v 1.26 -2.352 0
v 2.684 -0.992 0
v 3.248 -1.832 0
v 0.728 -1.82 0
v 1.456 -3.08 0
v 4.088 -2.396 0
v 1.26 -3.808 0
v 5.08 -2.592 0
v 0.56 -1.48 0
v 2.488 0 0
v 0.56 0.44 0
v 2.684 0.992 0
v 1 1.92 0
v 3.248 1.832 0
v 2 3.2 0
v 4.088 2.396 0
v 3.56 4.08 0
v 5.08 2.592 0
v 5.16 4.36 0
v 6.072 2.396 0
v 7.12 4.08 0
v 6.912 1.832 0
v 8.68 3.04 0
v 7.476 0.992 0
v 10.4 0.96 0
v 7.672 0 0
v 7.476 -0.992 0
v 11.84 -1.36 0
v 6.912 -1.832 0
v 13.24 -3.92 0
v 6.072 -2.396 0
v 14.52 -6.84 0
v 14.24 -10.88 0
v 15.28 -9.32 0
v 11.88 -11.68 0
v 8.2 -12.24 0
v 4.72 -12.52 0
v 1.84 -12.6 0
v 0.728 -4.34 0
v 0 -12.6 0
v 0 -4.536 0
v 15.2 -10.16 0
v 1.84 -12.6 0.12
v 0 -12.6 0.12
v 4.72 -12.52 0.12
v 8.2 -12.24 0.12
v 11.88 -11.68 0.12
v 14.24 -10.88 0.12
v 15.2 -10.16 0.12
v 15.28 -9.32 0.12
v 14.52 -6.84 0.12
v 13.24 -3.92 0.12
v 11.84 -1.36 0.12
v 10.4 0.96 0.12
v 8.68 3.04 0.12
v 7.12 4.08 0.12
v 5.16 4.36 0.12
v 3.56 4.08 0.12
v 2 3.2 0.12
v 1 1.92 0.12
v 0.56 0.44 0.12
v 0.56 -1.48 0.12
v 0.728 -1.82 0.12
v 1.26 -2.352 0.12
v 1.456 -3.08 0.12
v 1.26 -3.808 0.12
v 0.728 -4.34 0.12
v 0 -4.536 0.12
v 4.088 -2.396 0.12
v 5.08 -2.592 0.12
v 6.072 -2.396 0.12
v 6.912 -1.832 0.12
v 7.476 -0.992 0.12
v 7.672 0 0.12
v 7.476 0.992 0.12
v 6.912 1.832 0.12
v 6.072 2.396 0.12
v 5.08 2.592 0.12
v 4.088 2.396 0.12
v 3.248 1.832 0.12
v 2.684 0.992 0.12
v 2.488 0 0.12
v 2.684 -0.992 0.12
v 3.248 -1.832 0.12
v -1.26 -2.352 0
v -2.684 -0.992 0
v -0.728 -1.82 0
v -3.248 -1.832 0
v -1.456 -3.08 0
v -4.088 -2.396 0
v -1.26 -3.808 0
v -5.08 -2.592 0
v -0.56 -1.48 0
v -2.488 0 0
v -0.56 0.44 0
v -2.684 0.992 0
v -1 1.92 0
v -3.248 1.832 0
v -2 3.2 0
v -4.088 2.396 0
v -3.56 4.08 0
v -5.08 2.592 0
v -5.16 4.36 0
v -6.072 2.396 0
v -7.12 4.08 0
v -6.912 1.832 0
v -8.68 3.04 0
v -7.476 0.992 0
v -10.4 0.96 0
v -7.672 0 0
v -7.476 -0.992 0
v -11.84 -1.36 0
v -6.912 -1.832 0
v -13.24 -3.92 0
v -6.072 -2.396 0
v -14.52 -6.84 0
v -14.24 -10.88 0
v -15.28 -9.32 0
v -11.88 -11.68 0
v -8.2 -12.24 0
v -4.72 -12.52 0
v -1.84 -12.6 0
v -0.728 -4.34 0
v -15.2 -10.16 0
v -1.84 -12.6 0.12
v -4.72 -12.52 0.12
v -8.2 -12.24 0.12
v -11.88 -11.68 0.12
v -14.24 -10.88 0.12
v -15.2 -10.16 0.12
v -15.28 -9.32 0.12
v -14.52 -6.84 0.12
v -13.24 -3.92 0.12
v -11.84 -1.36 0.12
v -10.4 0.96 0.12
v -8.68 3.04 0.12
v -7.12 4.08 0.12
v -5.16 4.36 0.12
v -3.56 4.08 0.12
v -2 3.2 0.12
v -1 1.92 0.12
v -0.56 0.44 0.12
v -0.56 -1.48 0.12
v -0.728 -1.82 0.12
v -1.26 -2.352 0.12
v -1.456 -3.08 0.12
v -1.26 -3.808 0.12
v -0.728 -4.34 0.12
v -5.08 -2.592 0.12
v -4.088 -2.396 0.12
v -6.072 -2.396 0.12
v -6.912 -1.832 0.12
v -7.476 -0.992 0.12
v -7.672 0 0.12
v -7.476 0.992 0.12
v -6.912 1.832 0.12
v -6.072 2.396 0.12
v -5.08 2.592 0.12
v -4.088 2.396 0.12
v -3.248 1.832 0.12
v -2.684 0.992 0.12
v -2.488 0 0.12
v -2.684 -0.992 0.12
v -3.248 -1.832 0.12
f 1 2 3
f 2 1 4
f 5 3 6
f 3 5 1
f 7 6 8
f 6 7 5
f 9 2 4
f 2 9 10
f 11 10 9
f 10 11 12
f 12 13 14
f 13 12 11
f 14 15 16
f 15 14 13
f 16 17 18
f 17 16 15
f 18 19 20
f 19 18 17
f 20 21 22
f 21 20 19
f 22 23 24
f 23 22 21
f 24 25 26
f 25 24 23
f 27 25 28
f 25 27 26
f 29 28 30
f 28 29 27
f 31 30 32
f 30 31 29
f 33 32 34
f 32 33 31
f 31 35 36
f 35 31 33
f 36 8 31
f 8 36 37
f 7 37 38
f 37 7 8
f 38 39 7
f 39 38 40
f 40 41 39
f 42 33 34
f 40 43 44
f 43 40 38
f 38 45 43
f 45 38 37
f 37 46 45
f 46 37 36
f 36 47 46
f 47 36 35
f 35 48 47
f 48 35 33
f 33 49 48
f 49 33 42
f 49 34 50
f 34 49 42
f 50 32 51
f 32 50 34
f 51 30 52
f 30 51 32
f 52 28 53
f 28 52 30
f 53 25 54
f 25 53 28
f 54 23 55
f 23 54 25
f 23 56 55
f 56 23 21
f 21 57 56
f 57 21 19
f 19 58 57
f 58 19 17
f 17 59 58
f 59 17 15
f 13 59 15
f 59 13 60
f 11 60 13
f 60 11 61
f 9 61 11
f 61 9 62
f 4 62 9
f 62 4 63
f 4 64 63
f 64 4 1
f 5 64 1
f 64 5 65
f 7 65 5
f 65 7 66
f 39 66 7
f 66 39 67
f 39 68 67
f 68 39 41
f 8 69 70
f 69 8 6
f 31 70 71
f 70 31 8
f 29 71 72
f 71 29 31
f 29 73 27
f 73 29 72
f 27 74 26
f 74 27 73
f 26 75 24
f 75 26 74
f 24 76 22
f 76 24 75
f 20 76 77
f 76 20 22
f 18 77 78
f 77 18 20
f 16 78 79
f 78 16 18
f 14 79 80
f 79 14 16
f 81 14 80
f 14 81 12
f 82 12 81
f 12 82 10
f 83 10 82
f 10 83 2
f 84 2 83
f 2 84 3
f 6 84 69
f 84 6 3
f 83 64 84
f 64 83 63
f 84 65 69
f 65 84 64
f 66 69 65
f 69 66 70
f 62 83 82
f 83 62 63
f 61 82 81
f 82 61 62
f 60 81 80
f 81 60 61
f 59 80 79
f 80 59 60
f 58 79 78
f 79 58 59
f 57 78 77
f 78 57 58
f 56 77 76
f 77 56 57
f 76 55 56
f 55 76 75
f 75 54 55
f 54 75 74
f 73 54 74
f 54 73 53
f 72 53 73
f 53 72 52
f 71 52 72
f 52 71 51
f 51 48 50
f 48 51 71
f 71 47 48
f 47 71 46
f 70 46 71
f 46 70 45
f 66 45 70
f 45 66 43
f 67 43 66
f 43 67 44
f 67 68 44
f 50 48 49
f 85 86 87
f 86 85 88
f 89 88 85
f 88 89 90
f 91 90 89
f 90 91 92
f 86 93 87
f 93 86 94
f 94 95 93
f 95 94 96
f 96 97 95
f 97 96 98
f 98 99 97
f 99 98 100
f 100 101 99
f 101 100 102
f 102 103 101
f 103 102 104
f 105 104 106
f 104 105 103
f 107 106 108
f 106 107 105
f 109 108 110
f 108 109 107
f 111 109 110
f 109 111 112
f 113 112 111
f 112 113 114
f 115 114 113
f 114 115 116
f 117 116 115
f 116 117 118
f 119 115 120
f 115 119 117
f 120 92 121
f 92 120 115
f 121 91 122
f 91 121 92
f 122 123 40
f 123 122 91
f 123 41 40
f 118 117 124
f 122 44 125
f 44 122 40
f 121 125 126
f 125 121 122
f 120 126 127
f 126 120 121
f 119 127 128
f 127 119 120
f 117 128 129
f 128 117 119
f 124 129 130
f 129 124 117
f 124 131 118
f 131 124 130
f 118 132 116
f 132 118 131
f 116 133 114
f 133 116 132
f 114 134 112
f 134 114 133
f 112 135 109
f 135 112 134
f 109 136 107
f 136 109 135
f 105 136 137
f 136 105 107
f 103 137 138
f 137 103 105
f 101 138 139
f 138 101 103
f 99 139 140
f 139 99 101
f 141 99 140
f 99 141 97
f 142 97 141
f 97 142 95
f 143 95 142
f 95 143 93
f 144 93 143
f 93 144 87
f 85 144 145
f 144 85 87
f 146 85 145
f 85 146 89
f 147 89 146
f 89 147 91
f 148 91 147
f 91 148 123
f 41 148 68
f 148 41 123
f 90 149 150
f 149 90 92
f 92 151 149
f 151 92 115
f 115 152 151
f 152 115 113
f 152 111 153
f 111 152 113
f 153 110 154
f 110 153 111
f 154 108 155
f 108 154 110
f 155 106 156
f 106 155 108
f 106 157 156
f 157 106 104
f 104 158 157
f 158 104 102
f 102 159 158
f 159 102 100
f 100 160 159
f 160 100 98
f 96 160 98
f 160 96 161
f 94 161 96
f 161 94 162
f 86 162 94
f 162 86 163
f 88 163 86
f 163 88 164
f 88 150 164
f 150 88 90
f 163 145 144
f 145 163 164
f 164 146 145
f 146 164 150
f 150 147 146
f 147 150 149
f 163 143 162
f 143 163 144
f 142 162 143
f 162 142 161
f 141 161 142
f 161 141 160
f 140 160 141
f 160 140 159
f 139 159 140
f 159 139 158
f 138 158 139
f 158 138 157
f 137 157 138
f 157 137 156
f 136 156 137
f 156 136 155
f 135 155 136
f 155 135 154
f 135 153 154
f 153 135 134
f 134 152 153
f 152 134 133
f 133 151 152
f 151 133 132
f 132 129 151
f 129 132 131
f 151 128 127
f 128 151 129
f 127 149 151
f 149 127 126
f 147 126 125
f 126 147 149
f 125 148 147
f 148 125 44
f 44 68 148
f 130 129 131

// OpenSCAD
// file: s/20551s01.scad
use <../../lib.scad>
function ldraw_lib__s__20551s01() = [
// 0 ~Minifig Cape Cloth High Rounded Collar Surface - Half
// 0 Name: s\20551s01.dat
// 0 Author: Philippe Hurbain [Philo]
// 0 !LDRAW_ORG Subpart UPDATE 2020-03
// 0 !LICENSE Licensed under CC BY 2.0 and CC BY 4.0 : see CAreadme.txt
// 
// 0 BFC CERTIFY CCW
  [0,"BFC","CERTIFY"],
  [0,"BFC","CCW"],
// 
// 0 !HISTORY 2020-12-29 [PTadmin] Official Update 2020-03
// 
// 
// 4 16 8.12 0 -4.58 6.71 0 -2.48 1.82 0 -4.55 3.15 0 -5.88
  [4,16,8.12,0,-4.58,6.71,0,-2.48,1.82,0,-4.55,3.15,0,-5.88],
// 4 16 10.22 0 -5.99 8.12 0 -4.58 3.15 0 -5.88 3.64 0 -7.7
  [4,16,10.22,0,-5.99,8.12,0,-4.58,3.15,0,-5.88,3.64,0,-7.7],
// 4 16 12.7 0 -6.48 10.22 0 -5.99 3.64 0 -7.7 3.15 0 -9.52
  [4,16,12.7,0,-6.48,10.22,0,-5.99,3.64,0,-7.7,3.15,0,-9.52],
// 4 16 1.4 0 -3.7 1.82 0 -4.55 6.71 0 -2.48 6.22 0 0
  [4,16,1.4,0,-3.7,1.82,0,-4.55,6.71,0,-2.48,6.22,0,0],
// 4 16 1.4 0 1.1 1.4 0 -3.7 6.22 0 0 6.71 0 2.48
  [4,16,1.4,0,1.1,1.4,0,-3.7,6.22,0,0,6.71,0,2.48],
// 4 16 2.5 0 4.8 1.4 0 1.1 6.71 0 2.48 8.12 0 4.58
  [4,16,2.5,0,4.8,1.4,0,1.1,6.71,0,2.48,8.12,0,4.58],
// 4 16 5 0 8 2.5 0 4.8 8.12 0 4.58 10.22 0 5.99
  [4,16,5,0,8,2.5,0,4.8,8.12,0,4.58,10.22,0,5.99],
// 4 16 8.9 0 10.2 5 0 8 10.22 0 5.99 12.7 0 6.48
  [4,16,8.9,0,10.2,5,0,8,10.22,0,5.99,12.7,0,6.48],
// 4 16 12.9 0 10.9 8.9 0 10.2 12.7 0 6.48 15.18 0 5.99
  [4,16,12.9,0,10.9,8.9,0,10.2,12.7,0,6.48,15.18,0,5.99],
// 4 16 17.8 0 10.2 12.9 0 10.9 15.18 0 5.99 17.28 0 4.58
  [4,16,17.8,0,10.2,12.9,0,10.9,15.18,0,5.99,17.28,0,4.58],
// 4 16 21.7 0 7.6 17.8 0 10.2 17.28 0 4.58 18.69 0 2.48
  [4,16,21.7,0,7.6,17.8,0,10.2,17.28,0,4.58,18.69,0,2.48],
// 4 16 26 0 2.4 21.7 0 7.6 18.69 0 2.48 19.18 0 0
  [4,16,26,0,2.4,21.7,0,7.6,18.69,0,2.48,19.18,0,0],
// 4 16 29.6 0 -3.4 26 0 2.4 19.18 0 0 18.69 0 -2.48
  [4,16,29.6,0,-3.4,26,0,2.4,19.18,0,0,18.69,0,-2.48],
// 4 16 33.1 0 -9.8 29.6 0 -3.4 18.69 0 -2.48 17.28 0 -4.58
  [4,16,33.1,0,-9.8,29.6,0,-3.4,18.69,0,-2.48,17.28,0,-4.58],
// 4 16 36.3 0 -17.1 33.1 0 -9.8 17.28 0 -4.58 15.18 0 -5.99
  [4,16,36.3,0,-17.1,33.1,0,-9.8,17.28,0,-4.58,15.18,0,-5.99],
// 4 16 38.2 0 -23.3 36.3 0 -17.1 15.18 0 -5.99 35.6 0 -27.2
  [4,16,38.2,0,-23.3,36.3,0,-17.1,15.18,0,-5.99,35.6,0,-27.2],
// 4 16 29.7 0 -29.2 35.6 0 -27.2 15.18 0 -5.99 20.5 0 -30.6
  [4,16,29.7,0,-29.2,35.6,0,-27.2,15.18,0,-5.99,20.5,0,-30.6],
// 4 16 20.5 0 -30.6 15.18 0 -5.99 12.7 0 -6.48 11.8 0 -31.3
  [4,16,20.5,0,-30.6,15.18,0,-5.99,12.7,0,-6.48,11.8,0,-31.3],
// 4 16 11.8 0 -31.3 12.7 0 -6.48 3.15 0 -9.52 4.6 0 -31.5
  [4,16,11.8,0,-31.3,12.7,0,-6.48,3.15,0,-9.52,4.6,0,-31.5],
// 4 16 4.6 0 -31.5 3.15 0 -9.52 1.82 0 -10.85 0 0 -31.5
  [4,16,4.6,0,-31.5,3.15,0,-9.52,1.82,0,-10.85,0,0,-31.5],
// 3 16 1.82 0 -10.85 0 0 -11.34 0 0 -31.5
  [3,16,1.82,0,-10.85,0,0,-11.34,0,0,-31.5],
// 3 16 38.2 0 -23.3 35.6 0 -27.2 38 0 -25.4
  [3,16,38.2,0,-23.3,35.6,0,-27.2,38,0,-25.4],
];
makepoly(ldraw_lib__s__20551s01(), line=0.2);
// main file
use <../lib.scad>
use <s/20551s01.scad>
use <s/20551s02.scad>
function ldraw_lib__20551p01() = [
// 0 Minifig Cape Cloth High Rounded Collar with Black Side Pattern
// 0 Name: 20551p01.dat
// 0 Author: Philippe Hurbain [Philo]
// 0 !LDRAW_ORG Part UPDATE 2020-03
// 0 !LICENSE Licensed under CC BY 2.0 and CC BY 4.0 : see CAreadme.txt
// 
// 0 BFC CERTIFY CCW
  [0,"BFC","CERTIFY"],
  [0,"BFC","CCW"],
// 
// 0 !CATEGORY Sheet Fabric
// 0 !KEYWORDS Cloak, Neckwear
// 
// 0 !HISTORY 2020-12-29 [PTadmin] Official Update 2020-03
// 
// 
// 1 0 0 0 0 1 0 0 0 -1 0 0 0 1 s\20551s01.dat
  [1,0,0,0,0,1,0,0,0,-1,0,0,0,1, ldraw_lib__s__20551s01()],
// 1 16 0 0 0 1 0 0 0 1 0 0 0 1 s\20551s02.dat
  [1,16,0,0,0,1,0,0,0,1,0,0,0,1, ldraw_lib__s__20551s02()],
// 1 16 0 -.3 0 1 0 0 0 1 0 0 0 1 s\20551s01.dat
  [1,16,0,-.3,0,1,0,0,0,1,0,0,0,1, ldraw_lib__s__20551s01()],
// 1 0 0 0 0 -1 0 0 0 -1 0 0 0 1 s\20551s01.dat
  [1,0,0,0,0,-1,0,0,0,-1,0,0,0,1, ldraw_lib__s__20551s01()],
// 1 16 0 0 0 -1 0 0 0 1 0 0 0 1 s\20551s02.dat
  [1,16,0,0,0,-1,0,0,0,1,0,0,0,1, ldraw_lib__s__20551s02()],
// 1 16 0 -.3 0 -1 0 0 0 1 0 0 0 1 s\20551s01.dat
  [1,16,0,-.3,0,-1,0,0,0,1,0,0,0,1, ldraw_lib__s__20551s01()],
];
makepoly(ldraw_lib__20551p01(), line=0.2);
